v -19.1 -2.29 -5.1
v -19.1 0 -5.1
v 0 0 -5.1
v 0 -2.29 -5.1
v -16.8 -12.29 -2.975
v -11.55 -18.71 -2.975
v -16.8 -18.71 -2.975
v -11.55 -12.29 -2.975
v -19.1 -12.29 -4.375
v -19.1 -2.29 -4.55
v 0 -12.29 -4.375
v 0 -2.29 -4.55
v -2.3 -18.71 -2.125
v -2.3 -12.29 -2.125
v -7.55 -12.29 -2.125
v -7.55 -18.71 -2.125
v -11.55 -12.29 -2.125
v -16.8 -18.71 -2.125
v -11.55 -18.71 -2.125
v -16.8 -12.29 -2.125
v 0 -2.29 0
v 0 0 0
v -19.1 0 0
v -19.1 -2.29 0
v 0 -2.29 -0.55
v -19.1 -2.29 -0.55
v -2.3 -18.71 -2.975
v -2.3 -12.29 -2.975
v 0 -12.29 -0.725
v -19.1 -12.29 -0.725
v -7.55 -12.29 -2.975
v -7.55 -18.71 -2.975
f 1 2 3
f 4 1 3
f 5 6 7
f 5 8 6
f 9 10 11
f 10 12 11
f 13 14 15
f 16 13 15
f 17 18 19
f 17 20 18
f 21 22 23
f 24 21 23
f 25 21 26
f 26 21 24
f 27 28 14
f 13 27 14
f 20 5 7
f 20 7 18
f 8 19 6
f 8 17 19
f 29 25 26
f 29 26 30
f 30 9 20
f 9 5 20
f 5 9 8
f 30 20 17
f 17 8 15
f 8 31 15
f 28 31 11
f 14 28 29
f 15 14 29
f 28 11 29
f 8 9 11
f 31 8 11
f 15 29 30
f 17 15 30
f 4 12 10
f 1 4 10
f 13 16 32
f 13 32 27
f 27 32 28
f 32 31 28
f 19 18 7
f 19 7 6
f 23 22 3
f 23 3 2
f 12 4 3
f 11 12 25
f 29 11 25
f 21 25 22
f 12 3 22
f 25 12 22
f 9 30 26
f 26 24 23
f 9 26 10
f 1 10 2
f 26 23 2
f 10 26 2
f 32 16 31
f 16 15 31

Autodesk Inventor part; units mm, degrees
ref_plane "YZ Plane" through (0, 0, 0) normal (1, 0, 0) x (0, 1, 0)
ref_plane "XZ Plane" through (0, 0, 0) normal (0, 1, 0) x (-1, 0, 0)
ref_plane "XY Plane" through (0, 0, 0) normal (0, 0, 1) x (1, 0, 0)
sketch "Sketch1" plane through (0, 0, 0) normal (0, 1, 0) x (-1, 0, 0)
  line L0 (0, 0) -> (19.1, 0)
  line L1 (19.1, 0) -> (19.1, -5.1)
  line L2 (19.1, -5.1) -> (0, -5.1)
  line L3 (0, -5.1) -> (0, 0)
  dimension "d0" = 19.1
  dimension "d1" = 5.1
extrude "Extrusion1" add sketch "Sketch1" against normal blind 2.29
sketch "Sketch2" plane through (0, 0, 0) normal (1, 0, 0) x (0, 1, 0)
  line L0 (-2.29, -5.1) -> (-2.29, 0) projected
  line L1 (-2.29, -4.375) -> (-12.29, -4.375) construction
  line L2 (-12.29, -4.375) -> (-12.29, -0.725)
  line L3 (-12.29, -0.725) -> (-2.29, -0.725) construction
  line L4 (-2.29, -0.725) -> (-2.29, -4.375)
  line L5 (0, -5.1) -> (-2.29, -5.1) projected
  line L6 (-2.29, -4.55) -> (-2.29, -0.55)
  line L7 (-2.29, -4.55) -> (-12.29, -4.375)
  line L8 (-2.29, -0.55) -> (-12.29, -0.725)
  point P0 (0, 0)
  dimension "d5" = 3.65
  dimension "d6" = 0.725
  dimension "d7" = 4
  dimension "d8" = 0.55
  dimension "d19" = 10
extrude "Extrusion2" add sketch "Sketch2" against normal blind 19.1
sketch "Sketch3" plane through (0, -12.29, -4.375) normal (0, -1, 0) x (1, 0, 0)
  line L0 (-16.8, 2.25) -> (-2.3, 2.25) construction
  line L1 (-2.3, 2.25) -> (-2.3, 1.4) construction
  line L2 (-2.3, 1.4) -> (-16.8, 1.4) construction
  line L3 (-16.8, 1.4) -> (-16.8, 2.25) construction
  line L4 (-19.1, 0) -> (-19.1, 3.65) projected
  line L5 (0, 3.65) -> (-19.1, 3.65) projected
  line L6 (-16.8, 2.25) -> (-11.55, 2.25)
  line L7 (-11.55, 2.25) -> (-11.55, 1.4)
  line L8 (-11.55, 1.4) -> (-16.8, 1.4)
  line L9 (-16.8, 1.4) -> (-16.8, 2.25)
  line L10 (-2.3, 2.25) -> (-7.55, 2.25)
  line L11 (-7.55, 2.25) -> (-7.55, 1.4)
  line L12 (-7.55, 1.4) -> (-2.3, 1.4)
  line L13 (-2.3, 1.4) -> (-2.3, 2.25)
  point P0 (0, 4.375)
  dimension "d11" = 14.5
  dimension "d12" = 2.3
  dimension "d13" = 0.85
  dimension "d14" = 1.4
  dimension "d15" = 5.25
  dimension "d16" = 5.25
extrude "Extrusion3" add sketch "Sketch3" along normal blind 6.42
properties part number "fuse"
